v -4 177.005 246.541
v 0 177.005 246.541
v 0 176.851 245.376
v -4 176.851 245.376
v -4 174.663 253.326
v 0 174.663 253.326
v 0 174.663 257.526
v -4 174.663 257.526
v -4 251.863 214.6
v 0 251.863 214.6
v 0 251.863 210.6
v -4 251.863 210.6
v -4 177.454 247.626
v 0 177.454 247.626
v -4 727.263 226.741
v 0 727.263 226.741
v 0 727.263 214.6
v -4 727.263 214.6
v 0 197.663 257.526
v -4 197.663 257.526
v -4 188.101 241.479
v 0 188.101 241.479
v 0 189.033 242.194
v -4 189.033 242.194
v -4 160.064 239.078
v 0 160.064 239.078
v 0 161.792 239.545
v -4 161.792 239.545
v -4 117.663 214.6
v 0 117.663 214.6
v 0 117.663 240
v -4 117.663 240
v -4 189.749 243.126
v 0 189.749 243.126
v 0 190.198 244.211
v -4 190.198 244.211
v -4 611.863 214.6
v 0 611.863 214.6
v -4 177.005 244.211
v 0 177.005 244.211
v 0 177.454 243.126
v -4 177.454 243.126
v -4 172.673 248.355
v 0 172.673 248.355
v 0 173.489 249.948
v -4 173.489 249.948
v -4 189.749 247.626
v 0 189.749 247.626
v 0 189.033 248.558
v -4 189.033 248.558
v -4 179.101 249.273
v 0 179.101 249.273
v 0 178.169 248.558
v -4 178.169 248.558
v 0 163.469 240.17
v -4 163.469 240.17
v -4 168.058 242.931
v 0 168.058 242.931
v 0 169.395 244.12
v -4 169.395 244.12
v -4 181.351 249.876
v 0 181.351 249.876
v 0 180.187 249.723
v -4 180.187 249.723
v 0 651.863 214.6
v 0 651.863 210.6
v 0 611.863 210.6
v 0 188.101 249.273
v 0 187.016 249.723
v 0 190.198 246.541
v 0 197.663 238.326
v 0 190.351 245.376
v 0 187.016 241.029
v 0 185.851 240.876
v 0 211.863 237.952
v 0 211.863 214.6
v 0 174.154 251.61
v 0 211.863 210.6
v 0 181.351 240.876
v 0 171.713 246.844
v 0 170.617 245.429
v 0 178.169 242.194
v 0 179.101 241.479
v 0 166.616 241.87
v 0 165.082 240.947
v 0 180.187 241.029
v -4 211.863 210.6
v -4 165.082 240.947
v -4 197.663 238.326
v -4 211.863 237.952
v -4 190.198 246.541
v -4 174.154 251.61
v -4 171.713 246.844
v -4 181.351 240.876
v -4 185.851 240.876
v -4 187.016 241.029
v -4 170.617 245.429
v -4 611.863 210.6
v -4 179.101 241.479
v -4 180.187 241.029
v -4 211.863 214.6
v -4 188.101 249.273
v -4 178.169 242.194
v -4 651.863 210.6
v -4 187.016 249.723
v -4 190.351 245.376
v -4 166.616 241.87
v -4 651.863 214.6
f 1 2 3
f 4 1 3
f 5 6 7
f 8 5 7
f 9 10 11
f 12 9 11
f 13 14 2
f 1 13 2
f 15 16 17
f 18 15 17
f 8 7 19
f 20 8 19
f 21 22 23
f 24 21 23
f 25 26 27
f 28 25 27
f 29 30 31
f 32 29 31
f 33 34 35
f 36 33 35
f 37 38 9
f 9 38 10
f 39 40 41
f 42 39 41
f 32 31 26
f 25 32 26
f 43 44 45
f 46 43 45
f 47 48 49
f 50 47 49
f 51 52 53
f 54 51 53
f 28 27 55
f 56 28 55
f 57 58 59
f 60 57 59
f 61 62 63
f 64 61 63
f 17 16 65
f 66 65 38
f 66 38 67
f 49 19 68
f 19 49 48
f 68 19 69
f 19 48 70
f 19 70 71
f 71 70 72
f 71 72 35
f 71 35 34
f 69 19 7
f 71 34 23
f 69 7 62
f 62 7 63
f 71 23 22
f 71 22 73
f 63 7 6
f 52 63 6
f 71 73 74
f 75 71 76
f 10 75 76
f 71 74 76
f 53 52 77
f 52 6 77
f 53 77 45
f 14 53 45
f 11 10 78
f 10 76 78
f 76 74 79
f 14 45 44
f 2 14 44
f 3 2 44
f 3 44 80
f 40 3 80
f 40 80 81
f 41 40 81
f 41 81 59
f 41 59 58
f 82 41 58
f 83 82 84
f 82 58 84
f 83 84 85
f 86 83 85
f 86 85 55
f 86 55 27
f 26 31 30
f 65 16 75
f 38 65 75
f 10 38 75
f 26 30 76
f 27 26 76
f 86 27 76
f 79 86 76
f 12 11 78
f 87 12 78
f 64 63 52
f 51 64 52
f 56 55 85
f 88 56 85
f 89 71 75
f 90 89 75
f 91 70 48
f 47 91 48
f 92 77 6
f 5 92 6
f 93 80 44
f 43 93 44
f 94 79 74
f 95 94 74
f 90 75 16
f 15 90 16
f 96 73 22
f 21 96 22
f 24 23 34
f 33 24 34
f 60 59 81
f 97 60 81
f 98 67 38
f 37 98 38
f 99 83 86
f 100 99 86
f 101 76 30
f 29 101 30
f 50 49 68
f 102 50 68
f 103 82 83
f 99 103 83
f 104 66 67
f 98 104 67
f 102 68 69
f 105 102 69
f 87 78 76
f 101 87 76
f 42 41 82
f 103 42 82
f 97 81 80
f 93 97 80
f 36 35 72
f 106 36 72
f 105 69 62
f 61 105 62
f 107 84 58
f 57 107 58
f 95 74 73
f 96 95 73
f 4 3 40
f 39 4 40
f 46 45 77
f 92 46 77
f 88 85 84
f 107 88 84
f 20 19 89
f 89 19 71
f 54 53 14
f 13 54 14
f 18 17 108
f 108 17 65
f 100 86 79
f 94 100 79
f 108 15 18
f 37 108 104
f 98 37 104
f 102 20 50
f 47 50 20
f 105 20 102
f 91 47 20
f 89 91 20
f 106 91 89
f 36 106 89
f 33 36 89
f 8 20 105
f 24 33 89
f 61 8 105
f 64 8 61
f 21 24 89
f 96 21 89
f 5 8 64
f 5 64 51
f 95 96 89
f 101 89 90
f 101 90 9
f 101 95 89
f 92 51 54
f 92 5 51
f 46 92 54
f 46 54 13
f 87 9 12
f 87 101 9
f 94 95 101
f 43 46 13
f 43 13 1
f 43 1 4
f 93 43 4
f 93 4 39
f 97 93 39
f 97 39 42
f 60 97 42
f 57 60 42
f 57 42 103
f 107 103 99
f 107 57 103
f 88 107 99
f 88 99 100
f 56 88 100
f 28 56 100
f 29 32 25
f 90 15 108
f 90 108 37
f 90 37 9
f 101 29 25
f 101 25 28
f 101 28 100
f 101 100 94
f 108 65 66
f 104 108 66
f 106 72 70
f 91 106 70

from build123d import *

# Parameters (mm, degrees)
F1_DEPTH = 4
F2_ANGLE = 90
F3_ANGLE = 180


with BuildPart() as f1:
    # F0 (on Right) → F1 (new body)
    with BuildSketch(Plane.YZ):
        Polygon((-4.2630598, 224.8000076), (-3.8891464, 210.6000106), (7.3218294, -304.8), (19.4630294, -304.8), (19.4630294, -229.3999984), (23.4630468, -229.3999984), (23.4630468, -189.4000022), (19.4630294, -189.4000022), (19.4630294, 170.6000144), (23.4630468, 170.6000144), (23.4630468, 210.6000106), (19.4630294, 210.6000106), (19.4630294, 304.8), (-5.9369706, 304.8), (-5.0152046, 262.3993228), (-5.482082, 260.6712084), (-6.1067696, 258.9936908), (-6.883908, 257.381121), (-7.806817, 255.847342), (-8.867648, 254.4054856), (-10.057257, 253.0678962), (-11.3654586, 251.8460546), (-12.7810514, 250.7504256), (-14.2918942, 249.7904072), (-15.885033, 248.9742036), (-17.546828, 248.3088506), (-19.2630552, 247.8000124), (-23.4630468, 247.8000124), (-23.4630468, 224.8000076), align=None)
        Polygon((-14.4949672, 233.4296322), (-15.2101042, 234.361609), (-15.6596588, 235.4469256), (-15.8129986, 241.1116082), (-15.6596588, 242.2762998), (-15.2101042, 243.3616164), (-14.4949672, 244.2935932), (-13.5629904, 245.0087302), (-12.4776738, 245.4582594), (-11.3130076, 245.6115992), (-10.148316, 245.4582594), (-9.0629994, 245.0087302), (-8.1310226, 244.2935932), (-7.4158856, 243.3616164), (-6.966331, 242.2762998), (-6.8129912, 241.1116082), (-6.8129912, 236.6116172), (-6.966331, 235.4469256), (-7.4158856, 234.361609), (-8.1310226, 233.4296322), (-9.0629994, 232.7144952), (-10.148316, 232.2649406), (-11.3130076, 232.1116008), (-12.4776738, 232.2649406), (-13.5629904, 232.7144952), align=None, mode=Mode.SUBTRACT)
    extrude(amount=F1_DEPTH)


with BuildPart() as f1_1:
    # F2: moved
    add(f1.part.rotate(Axis((2, 23.4630468, 210.6000106), (-1, 0, 0)), F2_ANGLE))


with BuildPart() as f1_2:
    # F3: moved
    add(f1_1.part.rotate(Axis((0, 117.6630362, 227.300028), (0, 0, 1)), F3_ANGLE))


solid = f1_2.part
